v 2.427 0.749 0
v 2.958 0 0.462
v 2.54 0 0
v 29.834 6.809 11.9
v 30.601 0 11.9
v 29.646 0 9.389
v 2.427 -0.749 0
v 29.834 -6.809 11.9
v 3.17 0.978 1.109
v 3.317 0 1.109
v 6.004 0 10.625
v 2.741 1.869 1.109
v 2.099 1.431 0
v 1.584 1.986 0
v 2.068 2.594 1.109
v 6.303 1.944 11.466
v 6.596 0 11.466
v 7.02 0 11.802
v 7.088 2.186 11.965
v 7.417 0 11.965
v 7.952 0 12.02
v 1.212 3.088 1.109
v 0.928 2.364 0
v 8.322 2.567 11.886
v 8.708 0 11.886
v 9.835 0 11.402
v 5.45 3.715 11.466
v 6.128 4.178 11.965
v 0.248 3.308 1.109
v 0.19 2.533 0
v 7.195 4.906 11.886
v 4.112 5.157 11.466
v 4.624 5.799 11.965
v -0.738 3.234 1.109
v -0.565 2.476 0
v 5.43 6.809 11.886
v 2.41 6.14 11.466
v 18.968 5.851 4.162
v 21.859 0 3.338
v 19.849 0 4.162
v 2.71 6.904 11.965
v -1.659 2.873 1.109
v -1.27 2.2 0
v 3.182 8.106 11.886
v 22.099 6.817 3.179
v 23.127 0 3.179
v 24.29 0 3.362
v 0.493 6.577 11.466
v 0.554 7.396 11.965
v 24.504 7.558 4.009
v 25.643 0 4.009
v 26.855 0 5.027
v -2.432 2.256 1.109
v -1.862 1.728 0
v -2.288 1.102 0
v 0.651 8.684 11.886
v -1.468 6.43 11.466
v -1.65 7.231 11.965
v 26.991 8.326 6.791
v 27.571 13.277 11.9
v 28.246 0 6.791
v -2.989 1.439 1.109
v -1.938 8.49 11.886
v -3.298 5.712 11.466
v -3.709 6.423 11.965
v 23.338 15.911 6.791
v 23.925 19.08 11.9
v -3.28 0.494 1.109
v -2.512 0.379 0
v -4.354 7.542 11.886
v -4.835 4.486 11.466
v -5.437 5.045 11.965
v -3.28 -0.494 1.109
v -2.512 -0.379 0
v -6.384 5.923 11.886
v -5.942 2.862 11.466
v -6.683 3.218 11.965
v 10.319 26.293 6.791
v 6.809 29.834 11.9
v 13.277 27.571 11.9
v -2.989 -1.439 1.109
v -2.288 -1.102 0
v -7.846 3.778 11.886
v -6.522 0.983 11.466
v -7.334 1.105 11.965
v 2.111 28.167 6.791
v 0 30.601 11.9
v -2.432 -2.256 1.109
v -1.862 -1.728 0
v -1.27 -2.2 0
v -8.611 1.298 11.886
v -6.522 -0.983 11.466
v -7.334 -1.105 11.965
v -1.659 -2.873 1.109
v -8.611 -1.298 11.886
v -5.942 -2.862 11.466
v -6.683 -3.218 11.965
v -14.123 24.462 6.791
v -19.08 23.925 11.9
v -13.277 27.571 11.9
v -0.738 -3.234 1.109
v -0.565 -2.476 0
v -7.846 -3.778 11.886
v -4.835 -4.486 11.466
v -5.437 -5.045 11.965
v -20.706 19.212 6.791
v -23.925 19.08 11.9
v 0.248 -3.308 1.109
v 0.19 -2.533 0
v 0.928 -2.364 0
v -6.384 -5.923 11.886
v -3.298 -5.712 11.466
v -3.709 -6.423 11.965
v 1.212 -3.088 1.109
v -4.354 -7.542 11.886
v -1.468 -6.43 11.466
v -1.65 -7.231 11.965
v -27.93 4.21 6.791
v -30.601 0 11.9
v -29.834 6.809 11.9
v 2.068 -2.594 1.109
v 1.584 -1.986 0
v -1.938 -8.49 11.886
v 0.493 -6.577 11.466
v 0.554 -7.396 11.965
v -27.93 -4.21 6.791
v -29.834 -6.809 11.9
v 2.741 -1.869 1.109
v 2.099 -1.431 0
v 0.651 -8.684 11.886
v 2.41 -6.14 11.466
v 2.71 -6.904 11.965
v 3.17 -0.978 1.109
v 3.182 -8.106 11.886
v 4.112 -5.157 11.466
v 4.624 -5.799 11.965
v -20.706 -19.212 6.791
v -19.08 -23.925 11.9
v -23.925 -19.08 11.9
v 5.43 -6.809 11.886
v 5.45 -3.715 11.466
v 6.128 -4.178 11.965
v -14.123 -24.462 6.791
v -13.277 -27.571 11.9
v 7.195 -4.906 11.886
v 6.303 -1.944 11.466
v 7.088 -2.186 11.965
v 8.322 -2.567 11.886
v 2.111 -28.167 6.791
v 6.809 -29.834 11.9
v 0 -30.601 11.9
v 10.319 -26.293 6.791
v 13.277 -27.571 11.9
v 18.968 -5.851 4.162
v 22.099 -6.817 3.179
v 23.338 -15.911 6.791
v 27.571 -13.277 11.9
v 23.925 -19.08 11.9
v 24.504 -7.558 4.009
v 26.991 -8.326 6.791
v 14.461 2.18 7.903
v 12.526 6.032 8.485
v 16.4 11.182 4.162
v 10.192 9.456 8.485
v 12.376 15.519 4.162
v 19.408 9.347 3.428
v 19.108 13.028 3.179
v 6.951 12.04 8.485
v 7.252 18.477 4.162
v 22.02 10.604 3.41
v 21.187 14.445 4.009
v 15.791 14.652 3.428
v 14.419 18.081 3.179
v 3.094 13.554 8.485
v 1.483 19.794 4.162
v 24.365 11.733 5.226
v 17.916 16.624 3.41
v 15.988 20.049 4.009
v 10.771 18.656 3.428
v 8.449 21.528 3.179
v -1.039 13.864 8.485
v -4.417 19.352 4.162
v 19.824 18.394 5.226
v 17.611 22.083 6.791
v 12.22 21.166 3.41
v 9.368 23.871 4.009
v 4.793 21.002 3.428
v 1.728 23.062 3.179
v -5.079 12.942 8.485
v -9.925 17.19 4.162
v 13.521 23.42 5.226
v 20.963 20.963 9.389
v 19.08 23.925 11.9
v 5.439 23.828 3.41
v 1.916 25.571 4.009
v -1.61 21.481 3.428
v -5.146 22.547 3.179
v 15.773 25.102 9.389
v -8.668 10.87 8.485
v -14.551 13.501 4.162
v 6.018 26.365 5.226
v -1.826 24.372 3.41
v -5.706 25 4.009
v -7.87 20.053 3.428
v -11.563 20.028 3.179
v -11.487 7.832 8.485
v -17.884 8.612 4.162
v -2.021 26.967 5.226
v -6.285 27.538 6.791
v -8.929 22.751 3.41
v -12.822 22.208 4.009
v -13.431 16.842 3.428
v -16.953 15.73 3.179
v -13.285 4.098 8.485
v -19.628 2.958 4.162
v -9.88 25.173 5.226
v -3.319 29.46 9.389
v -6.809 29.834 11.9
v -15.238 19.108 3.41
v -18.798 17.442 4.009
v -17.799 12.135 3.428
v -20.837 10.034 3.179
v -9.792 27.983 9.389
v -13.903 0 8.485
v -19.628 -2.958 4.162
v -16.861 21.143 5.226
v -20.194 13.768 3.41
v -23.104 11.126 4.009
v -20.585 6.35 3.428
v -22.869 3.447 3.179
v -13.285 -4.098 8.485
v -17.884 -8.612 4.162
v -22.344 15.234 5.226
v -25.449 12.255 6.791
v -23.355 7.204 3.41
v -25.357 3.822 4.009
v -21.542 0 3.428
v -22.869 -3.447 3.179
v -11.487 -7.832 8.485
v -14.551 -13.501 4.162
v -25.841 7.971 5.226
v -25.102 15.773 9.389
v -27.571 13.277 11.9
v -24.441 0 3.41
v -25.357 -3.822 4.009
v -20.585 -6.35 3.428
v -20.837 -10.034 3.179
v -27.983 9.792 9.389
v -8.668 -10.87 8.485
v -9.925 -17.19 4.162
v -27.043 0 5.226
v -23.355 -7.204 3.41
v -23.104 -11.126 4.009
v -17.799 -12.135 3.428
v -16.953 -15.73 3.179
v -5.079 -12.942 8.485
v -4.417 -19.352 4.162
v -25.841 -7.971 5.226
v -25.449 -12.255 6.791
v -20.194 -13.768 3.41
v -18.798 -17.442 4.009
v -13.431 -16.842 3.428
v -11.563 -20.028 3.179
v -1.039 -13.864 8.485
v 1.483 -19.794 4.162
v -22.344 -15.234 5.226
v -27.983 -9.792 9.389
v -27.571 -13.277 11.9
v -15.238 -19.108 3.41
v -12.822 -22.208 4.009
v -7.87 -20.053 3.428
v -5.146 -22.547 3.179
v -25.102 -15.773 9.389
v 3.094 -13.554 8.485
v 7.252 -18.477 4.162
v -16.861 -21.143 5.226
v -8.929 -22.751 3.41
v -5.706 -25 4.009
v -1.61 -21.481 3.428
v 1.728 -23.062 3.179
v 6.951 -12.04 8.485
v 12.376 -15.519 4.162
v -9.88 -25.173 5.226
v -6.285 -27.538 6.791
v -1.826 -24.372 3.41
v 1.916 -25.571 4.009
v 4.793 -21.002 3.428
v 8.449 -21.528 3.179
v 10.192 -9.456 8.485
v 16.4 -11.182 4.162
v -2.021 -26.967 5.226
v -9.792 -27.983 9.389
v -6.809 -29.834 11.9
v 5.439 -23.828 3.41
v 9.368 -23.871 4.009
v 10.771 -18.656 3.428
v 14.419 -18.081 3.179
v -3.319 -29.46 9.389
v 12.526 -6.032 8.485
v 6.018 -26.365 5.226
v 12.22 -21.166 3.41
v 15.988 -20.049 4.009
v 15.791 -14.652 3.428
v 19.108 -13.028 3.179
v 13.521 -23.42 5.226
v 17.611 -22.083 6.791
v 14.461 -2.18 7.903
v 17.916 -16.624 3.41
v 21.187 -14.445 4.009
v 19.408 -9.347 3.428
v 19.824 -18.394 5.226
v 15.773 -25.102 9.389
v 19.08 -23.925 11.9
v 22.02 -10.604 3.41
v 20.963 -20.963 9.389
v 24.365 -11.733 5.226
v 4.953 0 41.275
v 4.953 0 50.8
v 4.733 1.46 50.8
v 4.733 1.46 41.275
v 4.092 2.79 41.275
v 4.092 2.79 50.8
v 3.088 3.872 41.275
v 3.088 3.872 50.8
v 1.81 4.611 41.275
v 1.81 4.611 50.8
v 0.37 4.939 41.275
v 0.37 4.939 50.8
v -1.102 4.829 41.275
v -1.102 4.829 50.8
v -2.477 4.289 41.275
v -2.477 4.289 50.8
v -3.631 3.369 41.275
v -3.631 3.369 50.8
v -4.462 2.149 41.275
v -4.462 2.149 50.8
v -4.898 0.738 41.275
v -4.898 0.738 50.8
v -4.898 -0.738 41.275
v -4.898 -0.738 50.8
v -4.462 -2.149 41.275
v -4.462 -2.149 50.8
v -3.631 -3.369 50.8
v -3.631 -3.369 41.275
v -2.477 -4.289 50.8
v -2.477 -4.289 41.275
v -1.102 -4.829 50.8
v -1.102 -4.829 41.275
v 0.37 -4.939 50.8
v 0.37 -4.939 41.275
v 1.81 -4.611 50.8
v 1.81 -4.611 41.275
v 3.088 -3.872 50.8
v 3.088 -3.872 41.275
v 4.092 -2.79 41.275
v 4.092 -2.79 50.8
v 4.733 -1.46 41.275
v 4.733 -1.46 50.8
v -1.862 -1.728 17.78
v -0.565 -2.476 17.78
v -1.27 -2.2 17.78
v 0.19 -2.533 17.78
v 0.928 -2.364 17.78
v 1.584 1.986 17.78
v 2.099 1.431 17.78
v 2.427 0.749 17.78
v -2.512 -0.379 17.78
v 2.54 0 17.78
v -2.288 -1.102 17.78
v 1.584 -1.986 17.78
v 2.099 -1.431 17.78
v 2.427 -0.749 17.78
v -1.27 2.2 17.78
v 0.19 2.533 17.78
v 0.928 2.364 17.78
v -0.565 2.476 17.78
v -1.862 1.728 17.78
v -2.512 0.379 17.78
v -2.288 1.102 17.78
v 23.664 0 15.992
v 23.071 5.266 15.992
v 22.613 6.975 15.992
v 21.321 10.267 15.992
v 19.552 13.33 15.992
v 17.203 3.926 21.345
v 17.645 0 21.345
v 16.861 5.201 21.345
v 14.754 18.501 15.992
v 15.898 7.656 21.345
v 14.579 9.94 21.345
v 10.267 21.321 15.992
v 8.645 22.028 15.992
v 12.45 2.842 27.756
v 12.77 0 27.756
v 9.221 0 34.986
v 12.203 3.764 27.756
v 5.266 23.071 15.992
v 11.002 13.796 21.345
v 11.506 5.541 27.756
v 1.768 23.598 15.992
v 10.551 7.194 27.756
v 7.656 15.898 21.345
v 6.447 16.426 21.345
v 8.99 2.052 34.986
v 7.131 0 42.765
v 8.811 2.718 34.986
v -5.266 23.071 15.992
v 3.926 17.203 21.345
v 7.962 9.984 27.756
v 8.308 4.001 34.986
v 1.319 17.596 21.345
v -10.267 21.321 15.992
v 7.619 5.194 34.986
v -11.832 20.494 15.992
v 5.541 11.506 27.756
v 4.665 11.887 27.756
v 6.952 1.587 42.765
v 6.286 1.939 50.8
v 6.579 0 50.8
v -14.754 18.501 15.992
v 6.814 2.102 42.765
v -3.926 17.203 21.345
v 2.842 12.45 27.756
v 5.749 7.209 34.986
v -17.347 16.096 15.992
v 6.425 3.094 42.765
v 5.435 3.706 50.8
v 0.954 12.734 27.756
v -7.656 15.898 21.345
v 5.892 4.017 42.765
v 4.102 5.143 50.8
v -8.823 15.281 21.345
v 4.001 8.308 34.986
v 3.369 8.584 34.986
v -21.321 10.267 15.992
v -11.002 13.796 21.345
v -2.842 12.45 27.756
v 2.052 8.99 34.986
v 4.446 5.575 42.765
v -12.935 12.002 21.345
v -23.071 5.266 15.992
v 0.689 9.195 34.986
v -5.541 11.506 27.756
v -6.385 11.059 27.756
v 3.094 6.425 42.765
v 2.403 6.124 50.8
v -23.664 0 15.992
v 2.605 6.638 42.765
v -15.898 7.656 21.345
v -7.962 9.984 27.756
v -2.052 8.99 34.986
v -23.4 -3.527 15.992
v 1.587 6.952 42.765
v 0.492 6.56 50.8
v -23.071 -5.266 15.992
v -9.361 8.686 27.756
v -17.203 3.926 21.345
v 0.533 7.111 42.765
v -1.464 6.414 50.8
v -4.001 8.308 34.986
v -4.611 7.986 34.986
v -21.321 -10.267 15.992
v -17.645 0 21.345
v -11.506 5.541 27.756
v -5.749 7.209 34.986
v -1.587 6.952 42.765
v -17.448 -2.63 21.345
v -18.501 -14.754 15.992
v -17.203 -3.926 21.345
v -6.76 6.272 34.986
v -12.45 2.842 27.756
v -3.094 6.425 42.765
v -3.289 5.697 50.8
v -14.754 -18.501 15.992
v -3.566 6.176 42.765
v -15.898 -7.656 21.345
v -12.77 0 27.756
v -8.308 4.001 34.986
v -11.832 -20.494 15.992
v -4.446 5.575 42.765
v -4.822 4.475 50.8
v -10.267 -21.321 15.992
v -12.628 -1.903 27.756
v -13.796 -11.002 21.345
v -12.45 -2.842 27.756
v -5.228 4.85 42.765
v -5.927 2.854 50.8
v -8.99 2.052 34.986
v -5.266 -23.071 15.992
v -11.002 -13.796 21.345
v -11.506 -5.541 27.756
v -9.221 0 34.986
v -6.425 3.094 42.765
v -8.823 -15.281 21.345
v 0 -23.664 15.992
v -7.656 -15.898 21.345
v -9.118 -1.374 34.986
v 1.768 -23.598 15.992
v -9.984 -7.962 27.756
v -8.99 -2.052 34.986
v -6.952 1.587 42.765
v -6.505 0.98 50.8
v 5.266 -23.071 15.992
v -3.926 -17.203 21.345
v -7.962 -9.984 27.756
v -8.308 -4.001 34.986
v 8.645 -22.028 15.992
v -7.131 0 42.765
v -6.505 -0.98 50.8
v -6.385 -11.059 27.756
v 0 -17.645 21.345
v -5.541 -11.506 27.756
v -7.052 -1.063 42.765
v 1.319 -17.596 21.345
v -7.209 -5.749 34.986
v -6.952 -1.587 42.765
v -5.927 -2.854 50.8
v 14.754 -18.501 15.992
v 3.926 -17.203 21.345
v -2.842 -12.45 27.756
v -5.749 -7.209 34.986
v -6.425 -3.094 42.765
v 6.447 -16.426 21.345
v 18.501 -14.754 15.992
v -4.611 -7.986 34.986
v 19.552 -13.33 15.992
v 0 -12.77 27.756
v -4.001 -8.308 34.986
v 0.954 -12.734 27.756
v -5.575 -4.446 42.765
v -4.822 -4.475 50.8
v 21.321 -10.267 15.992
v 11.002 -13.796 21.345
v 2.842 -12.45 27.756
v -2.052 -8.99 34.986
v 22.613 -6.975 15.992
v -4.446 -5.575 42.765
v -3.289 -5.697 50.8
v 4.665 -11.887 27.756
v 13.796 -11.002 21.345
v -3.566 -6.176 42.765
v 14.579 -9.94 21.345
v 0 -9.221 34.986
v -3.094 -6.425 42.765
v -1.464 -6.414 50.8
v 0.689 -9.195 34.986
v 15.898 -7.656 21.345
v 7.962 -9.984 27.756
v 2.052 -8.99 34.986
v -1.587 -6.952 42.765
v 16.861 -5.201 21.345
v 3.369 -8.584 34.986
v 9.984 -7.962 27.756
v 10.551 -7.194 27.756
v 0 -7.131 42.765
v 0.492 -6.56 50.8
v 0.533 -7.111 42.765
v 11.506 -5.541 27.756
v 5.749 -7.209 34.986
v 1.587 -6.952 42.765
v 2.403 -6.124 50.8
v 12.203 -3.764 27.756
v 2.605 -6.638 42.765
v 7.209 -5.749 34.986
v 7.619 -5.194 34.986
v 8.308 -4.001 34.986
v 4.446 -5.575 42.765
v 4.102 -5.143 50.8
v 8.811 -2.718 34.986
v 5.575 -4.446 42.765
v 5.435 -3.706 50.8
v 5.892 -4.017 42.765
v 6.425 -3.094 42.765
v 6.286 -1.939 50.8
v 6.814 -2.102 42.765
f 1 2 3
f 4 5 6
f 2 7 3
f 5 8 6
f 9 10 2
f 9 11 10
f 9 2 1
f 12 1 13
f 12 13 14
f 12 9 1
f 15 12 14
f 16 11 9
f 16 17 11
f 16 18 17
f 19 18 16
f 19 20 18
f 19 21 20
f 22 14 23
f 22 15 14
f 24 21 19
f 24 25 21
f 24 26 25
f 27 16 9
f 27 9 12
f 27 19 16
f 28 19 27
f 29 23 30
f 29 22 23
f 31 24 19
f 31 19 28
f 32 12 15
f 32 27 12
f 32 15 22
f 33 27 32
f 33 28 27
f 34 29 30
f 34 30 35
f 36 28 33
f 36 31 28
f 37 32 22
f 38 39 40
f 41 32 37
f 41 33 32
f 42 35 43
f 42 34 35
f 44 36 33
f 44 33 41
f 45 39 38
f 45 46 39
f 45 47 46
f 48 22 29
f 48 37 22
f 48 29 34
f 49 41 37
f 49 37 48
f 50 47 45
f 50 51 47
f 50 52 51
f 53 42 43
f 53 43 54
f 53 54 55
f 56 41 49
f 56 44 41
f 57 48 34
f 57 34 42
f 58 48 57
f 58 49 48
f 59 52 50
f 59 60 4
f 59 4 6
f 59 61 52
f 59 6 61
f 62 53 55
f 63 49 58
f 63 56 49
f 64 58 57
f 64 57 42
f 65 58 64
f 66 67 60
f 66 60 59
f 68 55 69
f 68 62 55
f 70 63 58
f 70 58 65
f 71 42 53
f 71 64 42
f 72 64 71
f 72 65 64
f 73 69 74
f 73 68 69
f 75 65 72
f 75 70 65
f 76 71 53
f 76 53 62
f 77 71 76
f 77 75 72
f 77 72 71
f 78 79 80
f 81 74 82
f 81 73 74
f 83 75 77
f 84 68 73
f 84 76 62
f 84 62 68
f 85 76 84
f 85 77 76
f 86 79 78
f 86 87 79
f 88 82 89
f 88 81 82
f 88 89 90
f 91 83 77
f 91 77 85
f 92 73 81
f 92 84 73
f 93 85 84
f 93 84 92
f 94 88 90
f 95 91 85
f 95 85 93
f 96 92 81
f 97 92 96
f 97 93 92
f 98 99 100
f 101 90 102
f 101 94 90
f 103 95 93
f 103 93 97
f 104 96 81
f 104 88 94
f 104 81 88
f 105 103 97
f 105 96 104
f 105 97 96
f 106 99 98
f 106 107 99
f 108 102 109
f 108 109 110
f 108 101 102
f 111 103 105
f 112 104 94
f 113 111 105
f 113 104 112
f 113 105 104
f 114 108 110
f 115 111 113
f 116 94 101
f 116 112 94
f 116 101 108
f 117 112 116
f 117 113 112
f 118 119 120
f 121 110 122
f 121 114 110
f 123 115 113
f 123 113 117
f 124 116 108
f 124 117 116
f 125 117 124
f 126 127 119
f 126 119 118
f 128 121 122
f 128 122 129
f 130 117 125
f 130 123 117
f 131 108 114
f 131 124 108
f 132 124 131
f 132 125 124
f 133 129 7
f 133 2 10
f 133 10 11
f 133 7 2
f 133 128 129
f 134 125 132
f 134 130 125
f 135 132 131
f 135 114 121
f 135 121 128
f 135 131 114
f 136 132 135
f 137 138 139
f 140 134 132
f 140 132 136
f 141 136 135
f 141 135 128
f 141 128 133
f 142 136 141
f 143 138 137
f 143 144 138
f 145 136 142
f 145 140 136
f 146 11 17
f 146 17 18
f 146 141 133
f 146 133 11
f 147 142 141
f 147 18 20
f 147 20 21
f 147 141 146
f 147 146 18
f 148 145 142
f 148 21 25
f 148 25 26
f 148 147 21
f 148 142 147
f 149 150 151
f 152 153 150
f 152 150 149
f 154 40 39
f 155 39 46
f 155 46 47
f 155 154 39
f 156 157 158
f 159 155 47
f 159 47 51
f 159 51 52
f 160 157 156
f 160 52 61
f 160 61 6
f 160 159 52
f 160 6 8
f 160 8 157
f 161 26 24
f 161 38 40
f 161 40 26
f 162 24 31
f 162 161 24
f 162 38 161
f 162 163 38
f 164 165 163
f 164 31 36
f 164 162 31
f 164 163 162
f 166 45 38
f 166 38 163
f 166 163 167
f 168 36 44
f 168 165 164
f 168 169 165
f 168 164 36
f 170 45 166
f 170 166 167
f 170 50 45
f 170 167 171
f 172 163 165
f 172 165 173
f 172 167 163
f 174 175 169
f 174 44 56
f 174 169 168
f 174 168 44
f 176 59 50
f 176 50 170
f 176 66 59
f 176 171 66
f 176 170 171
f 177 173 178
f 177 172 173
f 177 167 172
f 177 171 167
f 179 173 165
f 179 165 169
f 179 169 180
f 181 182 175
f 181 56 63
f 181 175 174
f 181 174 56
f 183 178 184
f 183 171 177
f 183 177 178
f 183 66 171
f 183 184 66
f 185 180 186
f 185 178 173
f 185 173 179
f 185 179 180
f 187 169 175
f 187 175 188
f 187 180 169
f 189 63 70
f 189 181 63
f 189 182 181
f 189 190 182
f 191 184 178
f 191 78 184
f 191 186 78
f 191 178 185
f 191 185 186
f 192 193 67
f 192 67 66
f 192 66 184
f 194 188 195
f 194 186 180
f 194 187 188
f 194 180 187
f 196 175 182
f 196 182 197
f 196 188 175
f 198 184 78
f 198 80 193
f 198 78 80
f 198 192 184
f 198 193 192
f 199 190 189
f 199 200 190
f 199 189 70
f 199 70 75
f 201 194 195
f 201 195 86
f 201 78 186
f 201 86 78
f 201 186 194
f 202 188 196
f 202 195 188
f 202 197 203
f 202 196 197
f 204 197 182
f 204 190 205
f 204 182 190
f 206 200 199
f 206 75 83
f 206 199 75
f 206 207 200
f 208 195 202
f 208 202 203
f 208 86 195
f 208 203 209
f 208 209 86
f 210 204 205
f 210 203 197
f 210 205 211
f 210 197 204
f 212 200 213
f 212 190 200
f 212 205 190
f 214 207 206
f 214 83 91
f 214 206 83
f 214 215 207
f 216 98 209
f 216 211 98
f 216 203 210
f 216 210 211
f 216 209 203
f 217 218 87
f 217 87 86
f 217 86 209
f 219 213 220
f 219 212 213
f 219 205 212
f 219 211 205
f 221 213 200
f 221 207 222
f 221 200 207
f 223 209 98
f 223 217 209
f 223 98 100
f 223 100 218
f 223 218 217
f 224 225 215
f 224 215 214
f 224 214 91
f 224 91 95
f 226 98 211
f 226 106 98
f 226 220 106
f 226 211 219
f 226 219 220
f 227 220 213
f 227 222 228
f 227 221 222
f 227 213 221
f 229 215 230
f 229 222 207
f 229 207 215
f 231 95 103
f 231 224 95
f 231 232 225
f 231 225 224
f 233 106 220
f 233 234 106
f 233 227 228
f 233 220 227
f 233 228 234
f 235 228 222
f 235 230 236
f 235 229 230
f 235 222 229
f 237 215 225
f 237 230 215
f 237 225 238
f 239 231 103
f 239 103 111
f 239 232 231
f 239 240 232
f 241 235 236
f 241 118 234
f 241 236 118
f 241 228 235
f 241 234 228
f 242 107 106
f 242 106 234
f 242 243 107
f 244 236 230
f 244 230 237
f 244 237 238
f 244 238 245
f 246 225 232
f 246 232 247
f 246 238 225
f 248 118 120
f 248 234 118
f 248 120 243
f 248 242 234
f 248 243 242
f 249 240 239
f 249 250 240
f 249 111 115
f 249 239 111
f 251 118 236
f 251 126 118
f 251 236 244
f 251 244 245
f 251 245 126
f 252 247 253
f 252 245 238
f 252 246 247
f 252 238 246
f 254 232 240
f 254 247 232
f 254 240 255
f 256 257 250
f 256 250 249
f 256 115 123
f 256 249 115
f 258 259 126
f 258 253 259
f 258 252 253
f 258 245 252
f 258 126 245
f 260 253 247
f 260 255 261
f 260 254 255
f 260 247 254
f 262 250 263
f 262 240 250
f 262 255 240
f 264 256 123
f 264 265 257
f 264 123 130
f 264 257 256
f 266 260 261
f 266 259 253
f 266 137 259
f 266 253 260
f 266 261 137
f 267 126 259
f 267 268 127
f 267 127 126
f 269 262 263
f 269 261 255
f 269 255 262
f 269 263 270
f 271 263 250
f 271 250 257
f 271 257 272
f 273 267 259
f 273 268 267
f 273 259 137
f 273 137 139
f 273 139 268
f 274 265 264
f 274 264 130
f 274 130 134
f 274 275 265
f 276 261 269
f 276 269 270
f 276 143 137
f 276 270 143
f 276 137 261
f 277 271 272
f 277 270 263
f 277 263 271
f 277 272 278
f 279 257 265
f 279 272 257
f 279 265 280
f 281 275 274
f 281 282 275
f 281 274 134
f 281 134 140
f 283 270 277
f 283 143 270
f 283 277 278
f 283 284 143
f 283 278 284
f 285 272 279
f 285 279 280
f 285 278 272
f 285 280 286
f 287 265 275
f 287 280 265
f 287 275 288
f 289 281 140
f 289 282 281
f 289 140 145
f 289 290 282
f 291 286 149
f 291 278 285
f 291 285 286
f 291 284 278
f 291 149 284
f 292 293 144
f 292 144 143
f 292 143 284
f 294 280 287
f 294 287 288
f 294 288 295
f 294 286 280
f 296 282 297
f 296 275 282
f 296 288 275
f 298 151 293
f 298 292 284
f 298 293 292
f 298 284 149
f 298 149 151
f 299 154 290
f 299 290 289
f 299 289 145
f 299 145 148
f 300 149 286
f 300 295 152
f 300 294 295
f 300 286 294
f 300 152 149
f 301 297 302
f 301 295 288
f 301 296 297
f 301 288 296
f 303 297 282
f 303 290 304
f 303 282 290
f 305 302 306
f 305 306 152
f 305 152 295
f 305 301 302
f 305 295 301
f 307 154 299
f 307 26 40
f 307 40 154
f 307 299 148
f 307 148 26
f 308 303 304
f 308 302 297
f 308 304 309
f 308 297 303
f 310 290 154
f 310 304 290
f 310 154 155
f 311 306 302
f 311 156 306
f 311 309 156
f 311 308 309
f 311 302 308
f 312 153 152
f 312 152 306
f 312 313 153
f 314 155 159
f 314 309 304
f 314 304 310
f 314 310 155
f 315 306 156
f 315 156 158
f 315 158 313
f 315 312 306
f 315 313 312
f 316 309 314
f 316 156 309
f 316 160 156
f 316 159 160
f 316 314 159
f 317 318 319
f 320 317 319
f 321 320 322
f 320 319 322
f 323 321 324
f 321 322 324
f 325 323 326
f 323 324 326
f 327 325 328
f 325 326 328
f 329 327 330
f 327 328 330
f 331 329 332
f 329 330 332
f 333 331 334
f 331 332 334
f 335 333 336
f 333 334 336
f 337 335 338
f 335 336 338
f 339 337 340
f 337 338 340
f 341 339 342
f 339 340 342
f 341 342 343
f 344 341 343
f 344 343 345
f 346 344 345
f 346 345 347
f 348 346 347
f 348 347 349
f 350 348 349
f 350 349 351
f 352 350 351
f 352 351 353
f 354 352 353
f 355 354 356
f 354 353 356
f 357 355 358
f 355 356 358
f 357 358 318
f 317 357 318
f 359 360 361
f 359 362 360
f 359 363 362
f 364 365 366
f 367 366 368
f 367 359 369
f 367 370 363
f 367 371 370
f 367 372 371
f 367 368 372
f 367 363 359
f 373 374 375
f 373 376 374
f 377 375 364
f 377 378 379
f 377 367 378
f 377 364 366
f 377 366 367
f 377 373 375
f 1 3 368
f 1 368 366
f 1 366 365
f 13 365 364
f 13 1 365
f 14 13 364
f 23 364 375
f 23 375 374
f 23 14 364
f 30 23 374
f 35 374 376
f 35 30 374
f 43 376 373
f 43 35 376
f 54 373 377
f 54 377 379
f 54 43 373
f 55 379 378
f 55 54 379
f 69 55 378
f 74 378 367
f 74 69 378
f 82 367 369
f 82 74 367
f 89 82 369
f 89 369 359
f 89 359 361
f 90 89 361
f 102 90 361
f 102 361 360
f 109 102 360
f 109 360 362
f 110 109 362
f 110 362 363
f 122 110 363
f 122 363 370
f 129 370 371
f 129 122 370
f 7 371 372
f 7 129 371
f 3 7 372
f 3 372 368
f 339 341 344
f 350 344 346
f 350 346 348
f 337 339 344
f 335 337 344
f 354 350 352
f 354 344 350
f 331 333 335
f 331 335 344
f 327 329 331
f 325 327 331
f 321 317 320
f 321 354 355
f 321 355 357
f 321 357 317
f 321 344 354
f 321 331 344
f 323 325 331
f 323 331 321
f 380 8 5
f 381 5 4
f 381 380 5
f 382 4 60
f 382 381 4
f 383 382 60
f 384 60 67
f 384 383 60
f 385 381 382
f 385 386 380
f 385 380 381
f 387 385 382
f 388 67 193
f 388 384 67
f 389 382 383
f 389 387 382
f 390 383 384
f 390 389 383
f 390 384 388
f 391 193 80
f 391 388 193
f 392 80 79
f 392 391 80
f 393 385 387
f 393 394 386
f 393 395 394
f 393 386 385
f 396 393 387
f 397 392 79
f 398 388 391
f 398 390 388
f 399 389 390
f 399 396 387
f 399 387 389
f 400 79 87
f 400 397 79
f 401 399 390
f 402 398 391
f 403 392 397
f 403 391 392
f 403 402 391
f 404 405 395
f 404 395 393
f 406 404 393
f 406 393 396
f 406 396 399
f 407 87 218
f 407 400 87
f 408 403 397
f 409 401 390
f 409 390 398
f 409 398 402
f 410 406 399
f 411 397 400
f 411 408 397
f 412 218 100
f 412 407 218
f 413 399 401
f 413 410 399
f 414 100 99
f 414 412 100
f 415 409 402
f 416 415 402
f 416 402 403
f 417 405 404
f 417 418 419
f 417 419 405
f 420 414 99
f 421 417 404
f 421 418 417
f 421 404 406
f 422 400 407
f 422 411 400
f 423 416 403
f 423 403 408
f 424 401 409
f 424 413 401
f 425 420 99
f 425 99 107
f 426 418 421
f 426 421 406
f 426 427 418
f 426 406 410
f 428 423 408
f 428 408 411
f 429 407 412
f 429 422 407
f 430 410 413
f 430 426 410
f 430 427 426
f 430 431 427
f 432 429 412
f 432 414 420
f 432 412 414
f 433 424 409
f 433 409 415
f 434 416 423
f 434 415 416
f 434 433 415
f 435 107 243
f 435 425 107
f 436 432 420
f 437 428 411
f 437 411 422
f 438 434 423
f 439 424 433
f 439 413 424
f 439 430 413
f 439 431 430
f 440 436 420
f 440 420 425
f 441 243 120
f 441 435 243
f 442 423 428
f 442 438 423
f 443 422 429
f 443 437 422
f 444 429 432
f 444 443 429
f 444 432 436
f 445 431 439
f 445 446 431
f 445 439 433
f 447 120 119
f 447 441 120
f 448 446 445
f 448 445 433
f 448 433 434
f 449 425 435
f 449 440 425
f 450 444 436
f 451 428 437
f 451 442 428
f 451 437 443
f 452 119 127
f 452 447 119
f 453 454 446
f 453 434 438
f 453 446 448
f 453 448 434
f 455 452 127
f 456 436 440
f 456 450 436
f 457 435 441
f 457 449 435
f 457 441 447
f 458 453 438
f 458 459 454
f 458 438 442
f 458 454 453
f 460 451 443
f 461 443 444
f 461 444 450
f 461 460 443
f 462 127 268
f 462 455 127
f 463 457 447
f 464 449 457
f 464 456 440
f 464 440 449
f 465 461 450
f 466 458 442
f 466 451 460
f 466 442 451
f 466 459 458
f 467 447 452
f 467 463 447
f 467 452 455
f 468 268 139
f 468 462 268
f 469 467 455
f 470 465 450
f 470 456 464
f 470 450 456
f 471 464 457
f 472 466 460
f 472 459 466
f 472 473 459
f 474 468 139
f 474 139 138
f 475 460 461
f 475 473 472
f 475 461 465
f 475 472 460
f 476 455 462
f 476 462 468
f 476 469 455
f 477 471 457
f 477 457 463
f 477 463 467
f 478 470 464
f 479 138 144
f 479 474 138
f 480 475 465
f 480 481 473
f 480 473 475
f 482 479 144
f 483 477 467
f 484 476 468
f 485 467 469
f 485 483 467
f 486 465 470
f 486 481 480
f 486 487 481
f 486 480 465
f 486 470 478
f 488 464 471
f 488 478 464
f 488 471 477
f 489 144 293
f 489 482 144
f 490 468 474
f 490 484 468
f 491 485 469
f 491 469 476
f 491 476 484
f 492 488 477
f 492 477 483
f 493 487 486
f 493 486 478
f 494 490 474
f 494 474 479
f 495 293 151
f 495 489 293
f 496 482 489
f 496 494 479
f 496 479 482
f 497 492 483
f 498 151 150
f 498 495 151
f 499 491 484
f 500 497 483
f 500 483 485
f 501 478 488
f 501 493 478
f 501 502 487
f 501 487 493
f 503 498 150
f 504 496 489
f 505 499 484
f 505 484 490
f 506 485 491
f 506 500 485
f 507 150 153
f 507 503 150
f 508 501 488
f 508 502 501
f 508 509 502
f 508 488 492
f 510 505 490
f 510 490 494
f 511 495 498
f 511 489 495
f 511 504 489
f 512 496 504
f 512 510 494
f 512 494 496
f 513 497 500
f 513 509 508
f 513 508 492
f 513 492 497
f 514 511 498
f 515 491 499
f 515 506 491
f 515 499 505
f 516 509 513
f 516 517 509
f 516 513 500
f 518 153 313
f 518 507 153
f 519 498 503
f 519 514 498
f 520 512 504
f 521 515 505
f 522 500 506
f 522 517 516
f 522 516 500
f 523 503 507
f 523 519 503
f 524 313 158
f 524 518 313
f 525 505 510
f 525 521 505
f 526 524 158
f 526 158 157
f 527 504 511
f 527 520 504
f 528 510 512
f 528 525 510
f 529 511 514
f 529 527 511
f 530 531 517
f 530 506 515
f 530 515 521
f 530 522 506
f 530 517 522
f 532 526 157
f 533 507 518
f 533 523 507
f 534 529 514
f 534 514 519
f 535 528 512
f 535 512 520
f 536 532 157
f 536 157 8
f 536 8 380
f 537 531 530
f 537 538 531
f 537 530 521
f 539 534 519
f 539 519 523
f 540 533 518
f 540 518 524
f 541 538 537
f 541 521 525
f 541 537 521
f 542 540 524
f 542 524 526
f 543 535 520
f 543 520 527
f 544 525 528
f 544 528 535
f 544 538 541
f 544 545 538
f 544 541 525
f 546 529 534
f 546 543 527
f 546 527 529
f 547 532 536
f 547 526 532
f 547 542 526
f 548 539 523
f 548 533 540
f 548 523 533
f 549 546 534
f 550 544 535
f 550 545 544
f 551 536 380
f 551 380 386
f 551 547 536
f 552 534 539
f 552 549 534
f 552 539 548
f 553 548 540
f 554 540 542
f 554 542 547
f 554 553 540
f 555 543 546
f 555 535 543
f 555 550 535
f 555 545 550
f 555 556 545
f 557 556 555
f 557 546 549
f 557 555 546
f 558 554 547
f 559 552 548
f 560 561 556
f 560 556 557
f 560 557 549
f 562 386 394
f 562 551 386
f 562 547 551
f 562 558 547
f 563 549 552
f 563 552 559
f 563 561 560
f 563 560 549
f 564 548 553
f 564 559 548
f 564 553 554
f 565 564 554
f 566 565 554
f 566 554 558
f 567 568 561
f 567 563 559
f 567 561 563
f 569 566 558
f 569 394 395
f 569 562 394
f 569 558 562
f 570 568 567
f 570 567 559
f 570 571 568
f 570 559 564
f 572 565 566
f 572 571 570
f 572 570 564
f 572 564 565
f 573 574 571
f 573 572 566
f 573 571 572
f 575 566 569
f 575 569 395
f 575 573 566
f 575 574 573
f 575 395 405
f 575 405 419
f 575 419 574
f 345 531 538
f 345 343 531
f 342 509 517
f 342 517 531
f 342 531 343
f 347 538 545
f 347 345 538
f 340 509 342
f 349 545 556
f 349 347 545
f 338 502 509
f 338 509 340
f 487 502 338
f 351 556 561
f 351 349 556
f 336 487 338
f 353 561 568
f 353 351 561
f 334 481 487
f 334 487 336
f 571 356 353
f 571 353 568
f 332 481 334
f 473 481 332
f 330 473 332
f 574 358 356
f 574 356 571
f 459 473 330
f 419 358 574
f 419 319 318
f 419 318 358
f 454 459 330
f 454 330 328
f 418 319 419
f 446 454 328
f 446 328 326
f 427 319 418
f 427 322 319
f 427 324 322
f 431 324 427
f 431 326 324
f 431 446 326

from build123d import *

# Parameters (mm, degrees)
F2_R     = 4.953
F3_DEPTH = 9.525
F4_DEPTH = 17.78


with BuildPart() as f1:
    # F0 (on Front) → F1 (revolve)
    with BuildSketch(Plane.XZ):
        with BuildLine():
            Line((0, 50.8), (0, 0))
            Line((0, 0), (2.54, 0))
            add(Edge.make_bspline(
                [(2.54, 0), (4.6722859433, 1.6956295225), (4.2763701134, 21.355319139), (23.4021219766, -4.0701360184), (29.4854754081, 8.3711690183), (30.601150829, 11.8996728591)],
                knots=[0, 0, 0, 0, 0.3185237965, 0.6935888291, 1, 1, 1, 1], degree=3))
            ThreePointArc((30.601150829, 11.8996728591), (12.7701470866, 27.7559149939), (6.5786, 50.8))
            Line((6.5786, 50.8), (0, 50.8))
        make_face()
    revolve(axis=Axis((0, 0, 25.4), (0, 0, 1)))

    # F2 (on face) → F3 (cut)
    with BuildSketch(Plane.XY.offset(50.8)):
        Circle(F2_R)
    extrude(amount=-F3_DEPTH, mode=Mode.SUBTRACT)

    # F4 (cut): a face of the model
    f4_faces = [f1.faces().sort_by_distance(p)[0] for p in [
        (0, 0, 0),
    ]]
    extrude(f4_faces, amount=-F4_DEPTH, mode=Mode.SUBTRACT)


solid = f1.part
